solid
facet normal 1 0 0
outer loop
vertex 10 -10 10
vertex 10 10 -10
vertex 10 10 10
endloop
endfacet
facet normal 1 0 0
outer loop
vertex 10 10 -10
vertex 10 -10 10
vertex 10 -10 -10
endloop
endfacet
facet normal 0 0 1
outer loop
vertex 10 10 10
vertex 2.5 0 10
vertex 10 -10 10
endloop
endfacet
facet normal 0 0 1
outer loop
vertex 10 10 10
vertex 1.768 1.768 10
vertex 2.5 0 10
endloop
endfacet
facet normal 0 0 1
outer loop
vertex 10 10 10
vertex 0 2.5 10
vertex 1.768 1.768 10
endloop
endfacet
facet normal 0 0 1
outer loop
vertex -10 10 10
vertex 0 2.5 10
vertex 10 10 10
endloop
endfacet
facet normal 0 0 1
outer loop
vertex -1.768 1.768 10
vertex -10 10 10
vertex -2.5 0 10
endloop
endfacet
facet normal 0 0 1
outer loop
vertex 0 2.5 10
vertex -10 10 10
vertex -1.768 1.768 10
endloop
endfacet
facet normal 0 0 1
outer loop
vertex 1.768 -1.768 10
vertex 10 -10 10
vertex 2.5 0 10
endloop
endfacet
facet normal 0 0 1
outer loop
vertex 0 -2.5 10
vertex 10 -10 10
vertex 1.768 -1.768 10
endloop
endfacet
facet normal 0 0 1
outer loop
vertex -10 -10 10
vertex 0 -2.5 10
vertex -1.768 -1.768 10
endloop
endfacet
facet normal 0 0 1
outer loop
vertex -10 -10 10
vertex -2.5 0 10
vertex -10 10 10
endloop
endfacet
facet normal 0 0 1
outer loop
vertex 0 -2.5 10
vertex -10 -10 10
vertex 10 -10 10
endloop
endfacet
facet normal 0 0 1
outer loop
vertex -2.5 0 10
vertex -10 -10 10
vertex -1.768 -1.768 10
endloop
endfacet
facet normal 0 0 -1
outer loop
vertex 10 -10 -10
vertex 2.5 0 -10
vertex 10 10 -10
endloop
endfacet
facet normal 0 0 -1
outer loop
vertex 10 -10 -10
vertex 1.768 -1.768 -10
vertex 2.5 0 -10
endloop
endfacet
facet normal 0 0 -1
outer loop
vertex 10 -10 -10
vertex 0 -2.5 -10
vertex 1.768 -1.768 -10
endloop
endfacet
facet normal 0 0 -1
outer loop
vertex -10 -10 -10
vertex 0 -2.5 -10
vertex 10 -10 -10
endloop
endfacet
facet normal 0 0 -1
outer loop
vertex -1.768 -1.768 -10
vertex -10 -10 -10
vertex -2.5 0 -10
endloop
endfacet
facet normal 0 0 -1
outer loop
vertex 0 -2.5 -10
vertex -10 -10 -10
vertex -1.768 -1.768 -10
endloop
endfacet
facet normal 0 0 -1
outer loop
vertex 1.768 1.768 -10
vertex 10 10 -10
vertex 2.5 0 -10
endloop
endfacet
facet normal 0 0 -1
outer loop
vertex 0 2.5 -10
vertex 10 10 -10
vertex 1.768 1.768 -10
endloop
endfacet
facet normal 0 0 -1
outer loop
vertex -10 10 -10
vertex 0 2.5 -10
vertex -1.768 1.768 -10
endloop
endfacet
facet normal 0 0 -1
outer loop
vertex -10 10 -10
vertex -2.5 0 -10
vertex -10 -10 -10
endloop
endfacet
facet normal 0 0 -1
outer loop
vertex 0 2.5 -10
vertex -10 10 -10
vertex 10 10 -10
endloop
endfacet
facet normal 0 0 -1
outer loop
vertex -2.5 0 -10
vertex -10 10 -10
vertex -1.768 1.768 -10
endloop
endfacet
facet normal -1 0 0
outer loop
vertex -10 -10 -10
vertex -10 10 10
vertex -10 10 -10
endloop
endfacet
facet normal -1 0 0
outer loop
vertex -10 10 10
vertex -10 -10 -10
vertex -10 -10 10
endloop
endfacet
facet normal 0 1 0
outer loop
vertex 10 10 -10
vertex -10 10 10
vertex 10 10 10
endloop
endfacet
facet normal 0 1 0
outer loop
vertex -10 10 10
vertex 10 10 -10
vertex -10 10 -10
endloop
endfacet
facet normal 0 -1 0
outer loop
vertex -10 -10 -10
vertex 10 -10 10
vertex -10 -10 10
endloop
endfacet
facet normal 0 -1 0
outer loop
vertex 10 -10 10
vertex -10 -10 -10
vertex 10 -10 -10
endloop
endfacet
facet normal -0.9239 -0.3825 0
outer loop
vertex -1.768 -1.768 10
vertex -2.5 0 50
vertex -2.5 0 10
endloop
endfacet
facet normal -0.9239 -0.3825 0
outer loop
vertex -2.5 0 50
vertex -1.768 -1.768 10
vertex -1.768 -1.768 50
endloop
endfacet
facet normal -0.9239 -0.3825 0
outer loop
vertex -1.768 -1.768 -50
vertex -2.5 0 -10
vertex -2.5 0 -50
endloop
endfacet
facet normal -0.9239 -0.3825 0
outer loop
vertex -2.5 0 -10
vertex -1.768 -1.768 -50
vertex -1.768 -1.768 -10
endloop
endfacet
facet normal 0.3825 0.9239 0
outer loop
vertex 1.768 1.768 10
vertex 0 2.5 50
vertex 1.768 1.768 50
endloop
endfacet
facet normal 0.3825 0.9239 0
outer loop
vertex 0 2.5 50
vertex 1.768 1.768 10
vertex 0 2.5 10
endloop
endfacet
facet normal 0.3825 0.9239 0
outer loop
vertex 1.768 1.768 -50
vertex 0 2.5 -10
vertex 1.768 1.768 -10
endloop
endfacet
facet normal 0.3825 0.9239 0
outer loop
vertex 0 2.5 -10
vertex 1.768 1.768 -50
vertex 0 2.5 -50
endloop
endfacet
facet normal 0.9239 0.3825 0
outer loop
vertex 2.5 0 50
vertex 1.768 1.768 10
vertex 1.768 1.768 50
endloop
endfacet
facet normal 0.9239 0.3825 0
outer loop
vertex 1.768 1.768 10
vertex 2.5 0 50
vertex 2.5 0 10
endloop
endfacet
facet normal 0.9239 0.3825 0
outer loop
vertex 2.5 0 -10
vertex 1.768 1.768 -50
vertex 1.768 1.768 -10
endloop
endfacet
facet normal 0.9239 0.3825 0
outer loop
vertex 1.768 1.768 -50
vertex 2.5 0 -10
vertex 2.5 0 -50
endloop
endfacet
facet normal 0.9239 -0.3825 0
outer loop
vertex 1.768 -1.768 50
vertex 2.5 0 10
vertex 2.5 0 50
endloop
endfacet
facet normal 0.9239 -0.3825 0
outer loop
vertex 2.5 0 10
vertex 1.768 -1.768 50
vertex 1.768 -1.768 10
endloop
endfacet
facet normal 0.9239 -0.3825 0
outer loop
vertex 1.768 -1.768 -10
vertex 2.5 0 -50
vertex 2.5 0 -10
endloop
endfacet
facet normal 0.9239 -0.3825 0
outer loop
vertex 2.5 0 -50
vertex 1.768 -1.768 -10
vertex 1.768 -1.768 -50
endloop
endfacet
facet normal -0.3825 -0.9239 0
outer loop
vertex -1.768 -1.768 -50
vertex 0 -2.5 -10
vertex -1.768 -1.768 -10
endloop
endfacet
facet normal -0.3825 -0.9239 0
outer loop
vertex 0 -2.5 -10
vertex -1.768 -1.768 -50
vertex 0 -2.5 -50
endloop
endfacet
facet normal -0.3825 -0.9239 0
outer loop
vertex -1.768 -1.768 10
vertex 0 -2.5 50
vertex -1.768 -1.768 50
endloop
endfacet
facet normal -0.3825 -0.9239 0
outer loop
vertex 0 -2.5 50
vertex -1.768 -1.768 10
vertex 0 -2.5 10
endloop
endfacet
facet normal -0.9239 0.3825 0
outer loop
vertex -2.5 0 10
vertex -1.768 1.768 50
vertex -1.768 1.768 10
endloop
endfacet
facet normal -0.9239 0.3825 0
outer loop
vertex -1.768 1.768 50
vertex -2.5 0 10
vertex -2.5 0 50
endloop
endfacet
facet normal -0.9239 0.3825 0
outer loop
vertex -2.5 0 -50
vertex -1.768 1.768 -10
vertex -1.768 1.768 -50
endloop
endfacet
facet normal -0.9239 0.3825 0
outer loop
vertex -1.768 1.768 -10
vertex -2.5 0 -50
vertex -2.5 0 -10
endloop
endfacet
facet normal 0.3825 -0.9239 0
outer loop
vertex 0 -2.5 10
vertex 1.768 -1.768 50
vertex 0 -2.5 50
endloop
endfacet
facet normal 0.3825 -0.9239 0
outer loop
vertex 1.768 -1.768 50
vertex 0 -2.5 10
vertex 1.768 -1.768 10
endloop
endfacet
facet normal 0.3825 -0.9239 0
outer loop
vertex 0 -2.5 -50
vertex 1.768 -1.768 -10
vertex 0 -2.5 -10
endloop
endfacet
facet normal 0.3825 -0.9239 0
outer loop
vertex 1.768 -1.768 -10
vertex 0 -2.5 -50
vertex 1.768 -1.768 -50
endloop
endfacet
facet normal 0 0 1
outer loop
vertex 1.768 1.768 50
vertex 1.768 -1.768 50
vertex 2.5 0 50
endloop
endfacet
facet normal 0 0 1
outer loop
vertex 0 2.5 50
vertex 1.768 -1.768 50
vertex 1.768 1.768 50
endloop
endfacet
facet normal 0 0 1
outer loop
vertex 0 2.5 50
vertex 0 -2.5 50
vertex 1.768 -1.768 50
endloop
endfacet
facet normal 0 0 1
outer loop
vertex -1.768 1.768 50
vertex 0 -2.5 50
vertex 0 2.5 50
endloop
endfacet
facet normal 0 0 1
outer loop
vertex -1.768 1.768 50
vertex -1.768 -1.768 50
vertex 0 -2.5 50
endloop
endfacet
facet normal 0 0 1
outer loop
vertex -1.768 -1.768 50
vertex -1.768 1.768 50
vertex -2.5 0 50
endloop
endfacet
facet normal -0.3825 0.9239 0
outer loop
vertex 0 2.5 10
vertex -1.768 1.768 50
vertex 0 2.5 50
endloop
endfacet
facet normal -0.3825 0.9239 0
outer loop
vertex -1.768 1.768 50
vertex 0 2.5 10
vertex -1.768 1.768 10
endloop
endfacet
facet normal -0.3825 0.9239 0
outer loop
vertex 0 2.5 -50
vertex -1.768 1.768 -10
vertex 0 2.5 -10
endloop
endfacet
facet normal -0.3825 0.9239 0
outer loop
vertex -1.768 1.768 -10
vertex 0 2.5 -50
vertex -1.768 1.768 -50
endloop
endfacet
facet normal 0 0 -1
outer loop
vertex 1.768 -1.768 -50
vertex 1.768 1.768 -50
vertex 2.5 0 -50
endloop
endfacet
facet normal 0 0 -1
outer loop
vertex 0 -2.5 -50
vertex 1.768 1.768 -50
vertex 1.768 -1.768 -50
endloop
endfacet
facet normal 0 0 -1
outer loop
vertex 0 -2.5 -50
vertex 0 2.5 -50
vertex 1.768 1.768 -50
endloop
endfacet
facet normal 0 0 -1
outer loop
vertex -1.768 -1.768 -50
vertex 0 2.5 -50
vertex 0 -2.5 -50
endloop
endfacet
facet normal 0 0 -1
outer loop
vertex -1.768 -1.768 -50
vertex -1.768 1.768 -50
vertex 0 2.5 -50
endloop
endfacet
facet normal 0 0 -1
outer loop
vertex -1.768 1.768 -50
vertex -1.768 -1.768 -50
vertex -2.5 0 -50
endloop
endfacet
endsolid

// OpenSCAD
// Very simple example for testing
cube_size = 20;
cylinder_height=100;
cylinder_color = "red";
cube(cube_size, center=true);
color(cylinder_color) cylinder(h=cylinder_height, d=5, center=true);
